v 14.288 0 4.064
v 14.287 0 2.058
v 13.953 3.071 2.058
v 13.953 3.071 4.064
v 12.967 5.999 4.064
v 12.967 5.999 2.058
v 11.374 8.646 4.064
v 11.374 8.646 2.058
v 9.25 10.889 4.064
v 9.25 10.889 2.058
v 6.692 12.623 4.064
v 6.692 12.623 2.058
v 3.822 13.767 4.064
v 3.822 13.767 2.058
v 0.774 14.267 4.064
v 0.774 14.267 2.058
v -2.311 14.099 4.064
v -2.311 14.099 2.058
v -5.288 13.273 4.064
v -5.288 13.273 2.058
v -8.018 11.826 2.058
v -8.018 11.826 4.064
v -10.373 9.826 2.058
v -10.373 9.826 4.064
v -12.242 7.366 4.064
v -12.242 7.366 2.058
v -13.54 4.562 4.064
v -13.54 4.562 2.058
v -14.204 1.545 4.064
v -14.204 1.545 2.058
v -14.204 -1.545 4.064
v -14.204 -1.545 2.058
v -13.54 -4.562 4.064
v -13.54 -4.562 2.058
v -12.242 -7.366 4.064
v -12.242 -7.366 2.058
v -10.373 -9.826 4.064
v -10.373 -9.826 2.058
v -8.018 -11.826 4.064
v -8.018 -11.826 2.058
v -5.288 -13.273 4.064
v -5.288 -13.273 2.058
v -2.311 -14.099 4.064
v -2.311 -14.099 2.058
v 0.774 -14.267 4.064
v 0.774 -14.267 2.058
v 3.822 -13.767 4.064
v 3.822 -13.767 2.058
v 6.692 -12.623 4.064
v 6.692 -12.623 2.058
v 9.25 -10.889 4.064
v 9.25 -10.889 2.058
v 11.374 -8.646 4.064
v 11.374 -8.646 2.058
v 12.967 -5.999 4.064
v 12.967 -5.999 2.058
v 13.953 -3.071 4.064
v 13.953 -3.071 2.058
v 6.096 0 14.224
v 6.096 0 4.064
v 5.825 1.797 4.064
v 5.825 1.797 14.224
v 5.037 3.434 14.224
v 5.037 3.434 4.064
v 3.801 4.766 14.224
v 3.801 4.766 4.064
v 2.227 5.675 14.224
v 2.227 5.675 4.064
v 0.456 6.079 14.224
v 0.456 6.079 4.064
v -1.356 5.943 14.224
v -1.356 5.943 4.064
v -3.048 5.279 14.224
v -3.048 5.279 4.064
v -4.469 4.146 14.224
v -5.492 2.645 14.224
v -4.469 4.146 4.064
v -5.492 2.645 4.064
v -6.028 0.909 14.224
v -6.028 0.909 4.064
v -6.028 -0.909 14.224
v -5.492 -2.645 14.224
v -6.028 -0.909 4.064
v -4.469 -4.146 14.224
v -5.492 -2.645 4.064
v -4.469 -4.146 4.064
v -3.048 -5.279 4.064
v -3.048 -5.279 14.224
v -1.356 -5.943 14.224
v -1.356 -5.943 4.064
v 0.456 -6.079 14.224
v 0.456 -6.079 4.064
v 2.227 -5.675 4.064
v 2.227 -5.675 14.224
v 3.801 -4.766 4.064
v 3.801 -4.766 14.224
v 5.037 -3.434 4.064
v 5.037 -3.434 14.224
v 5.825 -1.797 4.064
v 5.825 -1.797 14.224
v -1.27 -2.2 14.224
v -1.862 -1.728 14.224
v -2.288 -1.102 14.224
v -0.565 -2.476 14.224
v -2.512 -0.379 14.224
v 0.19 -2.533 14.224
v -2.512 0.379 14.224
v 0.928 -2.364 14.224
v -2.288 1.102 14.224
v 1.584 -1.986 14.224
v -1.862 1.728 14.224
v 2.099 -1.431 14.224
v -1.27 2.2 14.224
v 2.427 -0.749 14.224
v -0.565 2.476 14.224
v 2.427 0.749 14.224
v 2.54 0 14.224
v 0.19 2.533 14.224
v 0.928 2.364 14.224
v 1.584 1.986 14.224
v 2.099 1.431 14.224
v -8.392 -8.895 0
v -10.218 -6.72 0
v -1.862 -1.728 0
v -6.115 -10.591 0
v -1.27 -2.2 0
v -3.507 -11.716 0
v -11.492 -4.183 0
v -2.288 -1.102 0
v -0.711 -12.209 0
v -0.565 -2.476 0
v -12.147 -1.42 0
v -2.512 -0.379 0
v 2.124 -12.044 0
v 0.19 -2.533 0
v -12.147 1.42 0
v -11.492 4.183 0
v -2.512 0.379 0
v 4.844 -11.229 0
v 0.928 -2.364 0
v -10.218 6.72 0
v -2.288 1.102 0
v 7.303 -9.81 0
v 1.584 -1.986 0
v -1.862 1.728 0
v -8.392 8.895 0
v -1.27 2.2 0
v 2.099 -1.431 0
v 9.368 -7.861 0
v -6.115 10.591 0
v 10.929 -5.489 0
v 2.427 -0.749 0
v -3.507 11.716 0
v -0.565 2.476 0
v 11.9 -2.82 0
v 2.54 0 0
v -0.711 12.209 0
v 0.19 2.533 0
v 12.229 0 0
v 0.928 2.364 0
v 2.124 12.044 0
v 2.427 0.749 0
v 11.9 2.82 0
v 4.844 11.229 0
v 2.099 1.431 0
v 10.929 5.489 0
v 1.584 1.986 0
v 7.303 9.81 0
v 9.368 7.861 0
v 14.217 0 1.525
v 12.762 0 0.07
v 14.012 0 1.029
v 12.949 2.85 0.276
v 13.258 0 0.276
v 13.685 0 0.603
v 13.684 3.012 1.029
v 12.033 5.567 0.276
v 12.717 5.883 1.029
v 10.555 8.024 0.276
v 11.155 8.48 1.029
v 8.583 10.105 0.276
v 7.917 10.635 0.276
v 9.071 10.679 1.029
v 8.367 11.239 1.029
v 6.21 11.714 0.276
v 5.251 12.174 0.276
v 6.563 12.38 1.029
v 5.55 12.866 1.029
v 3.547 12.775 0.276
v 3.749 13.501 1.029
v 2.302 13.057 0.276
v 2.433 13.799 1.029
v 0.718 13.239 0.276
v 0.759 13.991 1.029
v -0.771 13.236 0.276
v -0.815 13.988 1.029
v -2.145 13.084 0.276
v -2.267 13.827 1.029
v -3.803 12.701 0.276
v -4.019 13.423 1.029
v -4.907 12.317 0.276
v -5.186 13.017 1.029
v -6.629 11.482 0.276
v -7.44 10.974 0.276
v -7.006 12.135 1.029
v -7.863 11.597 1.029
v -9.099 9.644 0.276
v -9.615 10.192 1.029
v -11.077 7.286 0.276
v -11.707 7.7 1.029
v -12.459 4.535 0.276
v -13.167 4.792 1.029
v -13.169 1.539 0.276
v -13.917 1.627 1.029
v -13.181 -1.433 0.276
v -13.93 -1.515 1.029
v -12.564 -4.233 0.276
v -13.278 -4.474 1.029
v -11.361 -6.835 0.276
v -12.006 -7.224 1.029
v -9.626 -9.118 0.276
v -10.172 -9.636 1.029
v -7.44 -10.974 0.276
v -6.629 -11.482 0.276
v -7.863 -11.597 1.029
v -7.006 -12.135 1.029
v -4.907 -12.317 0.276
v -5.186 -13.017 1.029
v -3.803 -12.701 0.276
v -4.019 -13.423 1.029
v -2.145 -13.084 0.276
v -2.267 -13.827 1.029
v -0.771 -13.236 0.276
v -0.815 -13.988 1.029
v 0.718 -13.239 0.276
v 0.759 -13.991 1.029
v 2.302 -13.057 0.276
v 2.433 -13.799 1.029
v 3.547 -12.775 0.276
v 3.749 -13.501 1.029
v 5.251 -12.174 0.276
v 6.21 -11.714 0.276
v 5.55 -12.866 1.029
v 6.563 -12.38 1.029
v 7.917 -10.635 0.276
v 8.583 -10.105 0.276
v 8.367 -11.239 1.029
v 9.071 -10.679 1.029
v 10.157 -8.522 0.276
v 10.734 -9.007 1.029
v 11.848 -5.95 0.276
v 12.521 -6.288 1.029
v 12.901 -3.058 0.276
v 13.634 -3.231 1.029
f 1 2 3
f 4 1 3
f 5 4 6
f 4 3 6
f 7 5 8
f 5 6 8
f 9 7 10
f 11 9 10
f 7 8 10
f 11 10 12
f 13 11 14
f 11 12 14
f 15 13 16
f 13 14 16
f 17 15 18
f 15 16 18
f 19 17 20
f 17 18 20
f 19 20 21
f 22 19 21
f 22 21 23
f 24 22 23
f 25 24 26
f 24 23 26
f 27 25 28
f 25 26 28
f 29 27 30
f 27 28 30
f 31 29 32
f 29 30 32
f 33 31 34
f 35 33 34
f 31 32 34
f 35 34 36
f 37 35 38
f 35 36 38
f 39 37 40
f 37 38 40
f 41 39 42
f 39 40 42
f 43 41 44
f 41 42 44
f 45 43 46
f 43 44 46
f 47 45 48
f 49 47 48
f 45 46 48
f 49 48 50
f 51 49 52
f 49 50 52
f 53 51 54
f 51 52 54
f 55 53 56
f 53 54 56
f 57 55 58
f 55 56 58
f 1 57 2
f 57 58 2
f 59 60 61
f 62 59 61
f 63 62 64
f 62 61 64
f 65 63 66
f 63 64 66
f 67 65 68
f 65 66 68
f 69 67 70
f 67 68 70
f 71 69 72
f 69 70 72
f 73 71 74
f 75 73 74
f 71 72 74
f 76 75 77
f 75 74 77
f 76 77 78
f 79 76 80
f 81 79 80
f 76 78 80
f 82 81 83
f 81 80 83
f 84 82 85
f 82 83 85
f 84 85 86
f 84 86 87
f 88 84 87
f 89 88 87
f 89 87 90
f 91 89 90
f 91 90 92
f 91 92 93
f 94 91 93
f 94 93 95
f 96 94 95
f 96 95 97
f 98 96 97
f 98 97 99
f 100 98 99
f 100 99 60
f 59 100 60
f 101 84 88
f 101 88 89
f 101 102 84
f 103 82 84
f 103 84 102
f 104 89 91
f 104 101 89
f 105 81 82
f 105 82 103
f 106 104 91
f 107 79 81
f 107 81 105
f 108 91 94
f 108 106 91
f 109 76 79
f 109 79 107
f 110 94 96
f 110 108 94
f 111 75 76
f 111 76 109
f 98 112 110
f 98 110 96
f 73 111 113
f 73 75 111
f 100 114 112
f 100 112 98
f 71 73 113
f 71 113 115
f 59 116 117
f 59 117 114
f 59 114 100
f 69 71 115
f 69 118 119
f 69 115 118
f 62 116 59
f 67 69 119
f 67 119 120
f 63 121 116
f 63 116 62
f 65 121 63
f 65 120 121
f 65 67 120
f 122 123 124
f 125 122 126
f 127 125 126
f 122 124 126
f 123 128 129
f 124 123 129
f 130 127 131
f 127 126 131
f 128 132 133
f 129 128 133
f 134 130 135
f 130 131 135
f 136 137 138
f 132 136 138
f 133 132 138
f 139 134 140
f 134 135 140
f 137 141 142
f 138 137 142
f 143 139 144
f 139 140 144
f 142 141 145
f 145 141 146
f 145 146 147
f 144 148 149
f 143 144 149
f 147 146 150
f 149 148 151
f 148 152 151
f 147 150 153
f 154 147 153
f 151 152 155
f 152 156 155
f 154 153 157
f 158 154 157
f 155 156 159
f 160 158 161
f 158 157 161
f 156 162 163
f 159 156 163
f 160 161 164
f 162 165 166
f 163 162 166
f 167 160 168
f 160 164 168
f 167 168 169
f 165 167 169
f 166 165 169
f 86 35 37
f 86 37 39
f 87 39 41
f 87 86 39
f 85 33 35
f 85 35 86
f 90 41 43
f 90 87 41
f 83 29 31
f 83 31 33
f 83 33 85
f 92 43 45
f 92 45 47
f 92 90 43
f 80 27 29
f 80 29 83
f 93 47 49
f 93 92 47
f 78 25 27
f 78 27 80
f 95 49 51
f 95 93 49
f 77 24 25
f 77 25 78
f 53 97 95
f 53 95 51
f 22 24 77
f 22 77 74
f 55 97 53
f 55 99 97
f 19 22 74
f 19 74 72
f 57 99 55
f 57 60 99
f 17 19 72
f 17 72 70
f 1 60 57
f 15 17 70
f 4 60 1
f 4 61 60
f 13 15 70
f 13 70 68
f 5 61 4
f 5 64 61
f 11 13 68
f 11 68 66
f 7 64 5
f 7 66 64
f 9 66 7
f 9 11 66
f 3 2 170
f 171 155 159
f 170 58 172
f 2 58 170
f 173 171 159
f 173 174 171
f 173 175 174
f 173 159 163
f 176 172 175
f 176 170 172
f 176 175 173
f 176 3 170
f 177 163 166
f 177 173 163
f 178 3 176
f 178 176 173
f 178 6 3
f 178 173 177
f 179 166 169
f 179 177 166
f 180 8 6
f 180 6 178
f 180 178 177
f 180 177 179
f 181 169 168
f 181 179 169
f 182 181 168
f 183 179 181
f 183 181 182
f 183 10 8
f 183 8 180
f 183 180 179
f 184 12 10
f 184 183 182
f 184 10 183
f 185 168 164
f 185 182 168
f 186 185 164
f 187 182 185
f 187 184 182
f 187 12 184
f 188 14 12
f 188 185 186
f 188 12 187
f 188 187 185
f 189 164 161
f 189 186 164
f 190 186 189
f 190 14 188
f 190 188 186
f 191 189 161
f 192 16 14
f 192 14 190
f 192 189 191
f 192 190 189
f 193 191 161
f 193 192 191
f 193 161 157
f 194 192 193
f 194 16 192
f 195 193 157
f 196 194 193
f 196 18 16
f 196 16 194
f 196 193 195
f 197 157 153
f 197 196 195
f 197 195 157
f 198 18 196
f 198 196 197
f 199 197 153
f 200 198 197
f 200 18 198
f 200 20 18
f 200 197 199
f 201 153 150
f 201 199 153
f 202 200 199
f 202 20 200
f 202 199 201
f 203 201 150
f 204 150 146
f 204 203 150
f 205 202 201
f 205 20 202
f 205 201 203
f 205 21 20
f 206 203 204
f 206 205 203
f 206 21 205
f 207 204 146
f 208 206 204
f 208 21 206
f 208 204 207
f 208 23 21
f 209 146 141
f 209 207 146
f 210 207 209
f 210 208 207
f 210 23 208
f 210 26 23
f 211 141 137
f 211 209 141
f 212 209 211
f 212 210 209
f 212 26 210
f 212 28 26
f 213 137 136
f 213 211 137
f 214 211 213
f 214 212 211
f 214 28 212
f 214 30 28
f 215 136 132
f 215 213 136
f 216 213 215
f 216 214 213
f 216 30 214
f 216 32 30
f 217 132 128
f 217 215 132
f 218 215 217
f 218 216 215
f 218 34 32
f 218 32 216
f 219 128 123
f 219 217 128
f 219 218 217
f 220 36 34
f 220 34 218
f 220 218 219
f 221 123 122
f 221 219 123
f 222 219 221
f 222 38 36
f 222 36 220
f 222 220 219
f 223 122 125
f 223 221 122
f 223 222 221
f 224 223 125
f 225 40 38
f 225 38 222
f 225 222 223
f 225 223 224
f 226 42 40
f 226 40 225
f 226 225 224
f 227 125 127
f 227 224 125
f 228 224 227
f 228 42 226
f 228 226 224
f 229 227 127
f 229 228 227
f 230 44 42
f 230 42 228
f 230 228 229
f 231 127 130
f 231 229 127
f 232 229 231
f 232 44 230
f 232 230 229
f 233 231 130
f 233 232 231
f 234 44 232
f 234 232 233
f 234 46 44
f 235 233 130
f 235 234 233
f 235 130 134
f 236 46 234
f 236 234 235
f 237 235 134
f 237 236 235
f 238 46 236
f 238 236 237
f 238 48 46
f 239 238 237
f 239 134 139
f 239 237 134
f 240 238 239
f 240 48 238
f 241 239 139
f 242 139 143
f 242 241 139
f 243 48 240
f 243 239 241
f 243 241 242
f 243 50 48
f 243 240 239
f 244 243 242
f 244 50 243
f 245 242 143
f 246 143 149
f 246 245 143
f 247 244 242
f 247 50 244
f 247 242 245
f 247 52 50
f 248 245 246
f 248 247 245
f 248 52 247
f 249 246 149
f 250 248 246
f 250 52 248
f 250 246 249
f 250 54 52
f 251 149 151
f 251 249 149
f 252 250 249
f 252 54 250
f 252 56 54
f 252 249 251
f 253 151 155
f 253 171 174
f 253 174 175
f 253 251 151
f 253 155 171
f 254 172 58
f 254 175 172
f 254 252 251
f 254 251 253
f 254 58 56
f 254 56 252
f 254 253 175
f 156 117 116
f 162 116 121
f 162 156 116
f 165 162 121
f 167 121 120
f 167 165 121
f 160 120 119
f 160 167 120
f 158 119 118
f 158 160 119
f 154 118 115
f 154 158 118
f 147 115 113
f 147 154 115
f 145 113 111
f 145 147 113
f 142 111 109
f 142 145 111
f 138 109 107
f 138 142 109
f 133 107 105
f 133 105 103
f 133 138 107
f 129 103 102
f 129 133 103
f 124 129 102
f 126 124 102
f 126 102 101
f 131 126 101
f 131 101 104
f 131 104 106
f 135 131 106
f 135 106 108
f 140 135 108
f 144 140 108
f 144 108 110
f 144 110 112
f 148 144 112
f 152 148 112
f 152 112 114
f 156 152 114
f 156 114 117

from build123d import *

# Parameters (mm, degrees)
F0_R     = 14.2875
F0_R_2   = 6.096
F0_R_3   = 2.54
F1_DEPTH = 4.064
F2_DEPTH = 14.224
F3_R     = 2.05802


with BuildPart() as f1:
    # F0 (on Top) → F1 (new body)
    with BuildSketch(Plane.XY):
        Circle(F0_R)
        Circle(F0_R_2, mode=Mode.SUBTRACT)
        Circle(F0_R_2)
        Circle(F0_R_3, mode=Mode.SUBTRACT)
    extrude(amount=F1_DEPTH)

    # F0 (on Top) → F2 (join)
    with BuildSketch(Plane.XY):
        Circle(F0_R_2)
        Circle(F0_R_3, mode=Mode.SUBTRACT)
    extrude(amount=F2_DEPTH)

    # F3
    f3_edges = [f1.edges().sort_by_distance(p)[0] for p in [
        (-14.2875, 0, 0),
    ]]
    fillet(f3_edges, radius=F3_R)


solid = f1.part
